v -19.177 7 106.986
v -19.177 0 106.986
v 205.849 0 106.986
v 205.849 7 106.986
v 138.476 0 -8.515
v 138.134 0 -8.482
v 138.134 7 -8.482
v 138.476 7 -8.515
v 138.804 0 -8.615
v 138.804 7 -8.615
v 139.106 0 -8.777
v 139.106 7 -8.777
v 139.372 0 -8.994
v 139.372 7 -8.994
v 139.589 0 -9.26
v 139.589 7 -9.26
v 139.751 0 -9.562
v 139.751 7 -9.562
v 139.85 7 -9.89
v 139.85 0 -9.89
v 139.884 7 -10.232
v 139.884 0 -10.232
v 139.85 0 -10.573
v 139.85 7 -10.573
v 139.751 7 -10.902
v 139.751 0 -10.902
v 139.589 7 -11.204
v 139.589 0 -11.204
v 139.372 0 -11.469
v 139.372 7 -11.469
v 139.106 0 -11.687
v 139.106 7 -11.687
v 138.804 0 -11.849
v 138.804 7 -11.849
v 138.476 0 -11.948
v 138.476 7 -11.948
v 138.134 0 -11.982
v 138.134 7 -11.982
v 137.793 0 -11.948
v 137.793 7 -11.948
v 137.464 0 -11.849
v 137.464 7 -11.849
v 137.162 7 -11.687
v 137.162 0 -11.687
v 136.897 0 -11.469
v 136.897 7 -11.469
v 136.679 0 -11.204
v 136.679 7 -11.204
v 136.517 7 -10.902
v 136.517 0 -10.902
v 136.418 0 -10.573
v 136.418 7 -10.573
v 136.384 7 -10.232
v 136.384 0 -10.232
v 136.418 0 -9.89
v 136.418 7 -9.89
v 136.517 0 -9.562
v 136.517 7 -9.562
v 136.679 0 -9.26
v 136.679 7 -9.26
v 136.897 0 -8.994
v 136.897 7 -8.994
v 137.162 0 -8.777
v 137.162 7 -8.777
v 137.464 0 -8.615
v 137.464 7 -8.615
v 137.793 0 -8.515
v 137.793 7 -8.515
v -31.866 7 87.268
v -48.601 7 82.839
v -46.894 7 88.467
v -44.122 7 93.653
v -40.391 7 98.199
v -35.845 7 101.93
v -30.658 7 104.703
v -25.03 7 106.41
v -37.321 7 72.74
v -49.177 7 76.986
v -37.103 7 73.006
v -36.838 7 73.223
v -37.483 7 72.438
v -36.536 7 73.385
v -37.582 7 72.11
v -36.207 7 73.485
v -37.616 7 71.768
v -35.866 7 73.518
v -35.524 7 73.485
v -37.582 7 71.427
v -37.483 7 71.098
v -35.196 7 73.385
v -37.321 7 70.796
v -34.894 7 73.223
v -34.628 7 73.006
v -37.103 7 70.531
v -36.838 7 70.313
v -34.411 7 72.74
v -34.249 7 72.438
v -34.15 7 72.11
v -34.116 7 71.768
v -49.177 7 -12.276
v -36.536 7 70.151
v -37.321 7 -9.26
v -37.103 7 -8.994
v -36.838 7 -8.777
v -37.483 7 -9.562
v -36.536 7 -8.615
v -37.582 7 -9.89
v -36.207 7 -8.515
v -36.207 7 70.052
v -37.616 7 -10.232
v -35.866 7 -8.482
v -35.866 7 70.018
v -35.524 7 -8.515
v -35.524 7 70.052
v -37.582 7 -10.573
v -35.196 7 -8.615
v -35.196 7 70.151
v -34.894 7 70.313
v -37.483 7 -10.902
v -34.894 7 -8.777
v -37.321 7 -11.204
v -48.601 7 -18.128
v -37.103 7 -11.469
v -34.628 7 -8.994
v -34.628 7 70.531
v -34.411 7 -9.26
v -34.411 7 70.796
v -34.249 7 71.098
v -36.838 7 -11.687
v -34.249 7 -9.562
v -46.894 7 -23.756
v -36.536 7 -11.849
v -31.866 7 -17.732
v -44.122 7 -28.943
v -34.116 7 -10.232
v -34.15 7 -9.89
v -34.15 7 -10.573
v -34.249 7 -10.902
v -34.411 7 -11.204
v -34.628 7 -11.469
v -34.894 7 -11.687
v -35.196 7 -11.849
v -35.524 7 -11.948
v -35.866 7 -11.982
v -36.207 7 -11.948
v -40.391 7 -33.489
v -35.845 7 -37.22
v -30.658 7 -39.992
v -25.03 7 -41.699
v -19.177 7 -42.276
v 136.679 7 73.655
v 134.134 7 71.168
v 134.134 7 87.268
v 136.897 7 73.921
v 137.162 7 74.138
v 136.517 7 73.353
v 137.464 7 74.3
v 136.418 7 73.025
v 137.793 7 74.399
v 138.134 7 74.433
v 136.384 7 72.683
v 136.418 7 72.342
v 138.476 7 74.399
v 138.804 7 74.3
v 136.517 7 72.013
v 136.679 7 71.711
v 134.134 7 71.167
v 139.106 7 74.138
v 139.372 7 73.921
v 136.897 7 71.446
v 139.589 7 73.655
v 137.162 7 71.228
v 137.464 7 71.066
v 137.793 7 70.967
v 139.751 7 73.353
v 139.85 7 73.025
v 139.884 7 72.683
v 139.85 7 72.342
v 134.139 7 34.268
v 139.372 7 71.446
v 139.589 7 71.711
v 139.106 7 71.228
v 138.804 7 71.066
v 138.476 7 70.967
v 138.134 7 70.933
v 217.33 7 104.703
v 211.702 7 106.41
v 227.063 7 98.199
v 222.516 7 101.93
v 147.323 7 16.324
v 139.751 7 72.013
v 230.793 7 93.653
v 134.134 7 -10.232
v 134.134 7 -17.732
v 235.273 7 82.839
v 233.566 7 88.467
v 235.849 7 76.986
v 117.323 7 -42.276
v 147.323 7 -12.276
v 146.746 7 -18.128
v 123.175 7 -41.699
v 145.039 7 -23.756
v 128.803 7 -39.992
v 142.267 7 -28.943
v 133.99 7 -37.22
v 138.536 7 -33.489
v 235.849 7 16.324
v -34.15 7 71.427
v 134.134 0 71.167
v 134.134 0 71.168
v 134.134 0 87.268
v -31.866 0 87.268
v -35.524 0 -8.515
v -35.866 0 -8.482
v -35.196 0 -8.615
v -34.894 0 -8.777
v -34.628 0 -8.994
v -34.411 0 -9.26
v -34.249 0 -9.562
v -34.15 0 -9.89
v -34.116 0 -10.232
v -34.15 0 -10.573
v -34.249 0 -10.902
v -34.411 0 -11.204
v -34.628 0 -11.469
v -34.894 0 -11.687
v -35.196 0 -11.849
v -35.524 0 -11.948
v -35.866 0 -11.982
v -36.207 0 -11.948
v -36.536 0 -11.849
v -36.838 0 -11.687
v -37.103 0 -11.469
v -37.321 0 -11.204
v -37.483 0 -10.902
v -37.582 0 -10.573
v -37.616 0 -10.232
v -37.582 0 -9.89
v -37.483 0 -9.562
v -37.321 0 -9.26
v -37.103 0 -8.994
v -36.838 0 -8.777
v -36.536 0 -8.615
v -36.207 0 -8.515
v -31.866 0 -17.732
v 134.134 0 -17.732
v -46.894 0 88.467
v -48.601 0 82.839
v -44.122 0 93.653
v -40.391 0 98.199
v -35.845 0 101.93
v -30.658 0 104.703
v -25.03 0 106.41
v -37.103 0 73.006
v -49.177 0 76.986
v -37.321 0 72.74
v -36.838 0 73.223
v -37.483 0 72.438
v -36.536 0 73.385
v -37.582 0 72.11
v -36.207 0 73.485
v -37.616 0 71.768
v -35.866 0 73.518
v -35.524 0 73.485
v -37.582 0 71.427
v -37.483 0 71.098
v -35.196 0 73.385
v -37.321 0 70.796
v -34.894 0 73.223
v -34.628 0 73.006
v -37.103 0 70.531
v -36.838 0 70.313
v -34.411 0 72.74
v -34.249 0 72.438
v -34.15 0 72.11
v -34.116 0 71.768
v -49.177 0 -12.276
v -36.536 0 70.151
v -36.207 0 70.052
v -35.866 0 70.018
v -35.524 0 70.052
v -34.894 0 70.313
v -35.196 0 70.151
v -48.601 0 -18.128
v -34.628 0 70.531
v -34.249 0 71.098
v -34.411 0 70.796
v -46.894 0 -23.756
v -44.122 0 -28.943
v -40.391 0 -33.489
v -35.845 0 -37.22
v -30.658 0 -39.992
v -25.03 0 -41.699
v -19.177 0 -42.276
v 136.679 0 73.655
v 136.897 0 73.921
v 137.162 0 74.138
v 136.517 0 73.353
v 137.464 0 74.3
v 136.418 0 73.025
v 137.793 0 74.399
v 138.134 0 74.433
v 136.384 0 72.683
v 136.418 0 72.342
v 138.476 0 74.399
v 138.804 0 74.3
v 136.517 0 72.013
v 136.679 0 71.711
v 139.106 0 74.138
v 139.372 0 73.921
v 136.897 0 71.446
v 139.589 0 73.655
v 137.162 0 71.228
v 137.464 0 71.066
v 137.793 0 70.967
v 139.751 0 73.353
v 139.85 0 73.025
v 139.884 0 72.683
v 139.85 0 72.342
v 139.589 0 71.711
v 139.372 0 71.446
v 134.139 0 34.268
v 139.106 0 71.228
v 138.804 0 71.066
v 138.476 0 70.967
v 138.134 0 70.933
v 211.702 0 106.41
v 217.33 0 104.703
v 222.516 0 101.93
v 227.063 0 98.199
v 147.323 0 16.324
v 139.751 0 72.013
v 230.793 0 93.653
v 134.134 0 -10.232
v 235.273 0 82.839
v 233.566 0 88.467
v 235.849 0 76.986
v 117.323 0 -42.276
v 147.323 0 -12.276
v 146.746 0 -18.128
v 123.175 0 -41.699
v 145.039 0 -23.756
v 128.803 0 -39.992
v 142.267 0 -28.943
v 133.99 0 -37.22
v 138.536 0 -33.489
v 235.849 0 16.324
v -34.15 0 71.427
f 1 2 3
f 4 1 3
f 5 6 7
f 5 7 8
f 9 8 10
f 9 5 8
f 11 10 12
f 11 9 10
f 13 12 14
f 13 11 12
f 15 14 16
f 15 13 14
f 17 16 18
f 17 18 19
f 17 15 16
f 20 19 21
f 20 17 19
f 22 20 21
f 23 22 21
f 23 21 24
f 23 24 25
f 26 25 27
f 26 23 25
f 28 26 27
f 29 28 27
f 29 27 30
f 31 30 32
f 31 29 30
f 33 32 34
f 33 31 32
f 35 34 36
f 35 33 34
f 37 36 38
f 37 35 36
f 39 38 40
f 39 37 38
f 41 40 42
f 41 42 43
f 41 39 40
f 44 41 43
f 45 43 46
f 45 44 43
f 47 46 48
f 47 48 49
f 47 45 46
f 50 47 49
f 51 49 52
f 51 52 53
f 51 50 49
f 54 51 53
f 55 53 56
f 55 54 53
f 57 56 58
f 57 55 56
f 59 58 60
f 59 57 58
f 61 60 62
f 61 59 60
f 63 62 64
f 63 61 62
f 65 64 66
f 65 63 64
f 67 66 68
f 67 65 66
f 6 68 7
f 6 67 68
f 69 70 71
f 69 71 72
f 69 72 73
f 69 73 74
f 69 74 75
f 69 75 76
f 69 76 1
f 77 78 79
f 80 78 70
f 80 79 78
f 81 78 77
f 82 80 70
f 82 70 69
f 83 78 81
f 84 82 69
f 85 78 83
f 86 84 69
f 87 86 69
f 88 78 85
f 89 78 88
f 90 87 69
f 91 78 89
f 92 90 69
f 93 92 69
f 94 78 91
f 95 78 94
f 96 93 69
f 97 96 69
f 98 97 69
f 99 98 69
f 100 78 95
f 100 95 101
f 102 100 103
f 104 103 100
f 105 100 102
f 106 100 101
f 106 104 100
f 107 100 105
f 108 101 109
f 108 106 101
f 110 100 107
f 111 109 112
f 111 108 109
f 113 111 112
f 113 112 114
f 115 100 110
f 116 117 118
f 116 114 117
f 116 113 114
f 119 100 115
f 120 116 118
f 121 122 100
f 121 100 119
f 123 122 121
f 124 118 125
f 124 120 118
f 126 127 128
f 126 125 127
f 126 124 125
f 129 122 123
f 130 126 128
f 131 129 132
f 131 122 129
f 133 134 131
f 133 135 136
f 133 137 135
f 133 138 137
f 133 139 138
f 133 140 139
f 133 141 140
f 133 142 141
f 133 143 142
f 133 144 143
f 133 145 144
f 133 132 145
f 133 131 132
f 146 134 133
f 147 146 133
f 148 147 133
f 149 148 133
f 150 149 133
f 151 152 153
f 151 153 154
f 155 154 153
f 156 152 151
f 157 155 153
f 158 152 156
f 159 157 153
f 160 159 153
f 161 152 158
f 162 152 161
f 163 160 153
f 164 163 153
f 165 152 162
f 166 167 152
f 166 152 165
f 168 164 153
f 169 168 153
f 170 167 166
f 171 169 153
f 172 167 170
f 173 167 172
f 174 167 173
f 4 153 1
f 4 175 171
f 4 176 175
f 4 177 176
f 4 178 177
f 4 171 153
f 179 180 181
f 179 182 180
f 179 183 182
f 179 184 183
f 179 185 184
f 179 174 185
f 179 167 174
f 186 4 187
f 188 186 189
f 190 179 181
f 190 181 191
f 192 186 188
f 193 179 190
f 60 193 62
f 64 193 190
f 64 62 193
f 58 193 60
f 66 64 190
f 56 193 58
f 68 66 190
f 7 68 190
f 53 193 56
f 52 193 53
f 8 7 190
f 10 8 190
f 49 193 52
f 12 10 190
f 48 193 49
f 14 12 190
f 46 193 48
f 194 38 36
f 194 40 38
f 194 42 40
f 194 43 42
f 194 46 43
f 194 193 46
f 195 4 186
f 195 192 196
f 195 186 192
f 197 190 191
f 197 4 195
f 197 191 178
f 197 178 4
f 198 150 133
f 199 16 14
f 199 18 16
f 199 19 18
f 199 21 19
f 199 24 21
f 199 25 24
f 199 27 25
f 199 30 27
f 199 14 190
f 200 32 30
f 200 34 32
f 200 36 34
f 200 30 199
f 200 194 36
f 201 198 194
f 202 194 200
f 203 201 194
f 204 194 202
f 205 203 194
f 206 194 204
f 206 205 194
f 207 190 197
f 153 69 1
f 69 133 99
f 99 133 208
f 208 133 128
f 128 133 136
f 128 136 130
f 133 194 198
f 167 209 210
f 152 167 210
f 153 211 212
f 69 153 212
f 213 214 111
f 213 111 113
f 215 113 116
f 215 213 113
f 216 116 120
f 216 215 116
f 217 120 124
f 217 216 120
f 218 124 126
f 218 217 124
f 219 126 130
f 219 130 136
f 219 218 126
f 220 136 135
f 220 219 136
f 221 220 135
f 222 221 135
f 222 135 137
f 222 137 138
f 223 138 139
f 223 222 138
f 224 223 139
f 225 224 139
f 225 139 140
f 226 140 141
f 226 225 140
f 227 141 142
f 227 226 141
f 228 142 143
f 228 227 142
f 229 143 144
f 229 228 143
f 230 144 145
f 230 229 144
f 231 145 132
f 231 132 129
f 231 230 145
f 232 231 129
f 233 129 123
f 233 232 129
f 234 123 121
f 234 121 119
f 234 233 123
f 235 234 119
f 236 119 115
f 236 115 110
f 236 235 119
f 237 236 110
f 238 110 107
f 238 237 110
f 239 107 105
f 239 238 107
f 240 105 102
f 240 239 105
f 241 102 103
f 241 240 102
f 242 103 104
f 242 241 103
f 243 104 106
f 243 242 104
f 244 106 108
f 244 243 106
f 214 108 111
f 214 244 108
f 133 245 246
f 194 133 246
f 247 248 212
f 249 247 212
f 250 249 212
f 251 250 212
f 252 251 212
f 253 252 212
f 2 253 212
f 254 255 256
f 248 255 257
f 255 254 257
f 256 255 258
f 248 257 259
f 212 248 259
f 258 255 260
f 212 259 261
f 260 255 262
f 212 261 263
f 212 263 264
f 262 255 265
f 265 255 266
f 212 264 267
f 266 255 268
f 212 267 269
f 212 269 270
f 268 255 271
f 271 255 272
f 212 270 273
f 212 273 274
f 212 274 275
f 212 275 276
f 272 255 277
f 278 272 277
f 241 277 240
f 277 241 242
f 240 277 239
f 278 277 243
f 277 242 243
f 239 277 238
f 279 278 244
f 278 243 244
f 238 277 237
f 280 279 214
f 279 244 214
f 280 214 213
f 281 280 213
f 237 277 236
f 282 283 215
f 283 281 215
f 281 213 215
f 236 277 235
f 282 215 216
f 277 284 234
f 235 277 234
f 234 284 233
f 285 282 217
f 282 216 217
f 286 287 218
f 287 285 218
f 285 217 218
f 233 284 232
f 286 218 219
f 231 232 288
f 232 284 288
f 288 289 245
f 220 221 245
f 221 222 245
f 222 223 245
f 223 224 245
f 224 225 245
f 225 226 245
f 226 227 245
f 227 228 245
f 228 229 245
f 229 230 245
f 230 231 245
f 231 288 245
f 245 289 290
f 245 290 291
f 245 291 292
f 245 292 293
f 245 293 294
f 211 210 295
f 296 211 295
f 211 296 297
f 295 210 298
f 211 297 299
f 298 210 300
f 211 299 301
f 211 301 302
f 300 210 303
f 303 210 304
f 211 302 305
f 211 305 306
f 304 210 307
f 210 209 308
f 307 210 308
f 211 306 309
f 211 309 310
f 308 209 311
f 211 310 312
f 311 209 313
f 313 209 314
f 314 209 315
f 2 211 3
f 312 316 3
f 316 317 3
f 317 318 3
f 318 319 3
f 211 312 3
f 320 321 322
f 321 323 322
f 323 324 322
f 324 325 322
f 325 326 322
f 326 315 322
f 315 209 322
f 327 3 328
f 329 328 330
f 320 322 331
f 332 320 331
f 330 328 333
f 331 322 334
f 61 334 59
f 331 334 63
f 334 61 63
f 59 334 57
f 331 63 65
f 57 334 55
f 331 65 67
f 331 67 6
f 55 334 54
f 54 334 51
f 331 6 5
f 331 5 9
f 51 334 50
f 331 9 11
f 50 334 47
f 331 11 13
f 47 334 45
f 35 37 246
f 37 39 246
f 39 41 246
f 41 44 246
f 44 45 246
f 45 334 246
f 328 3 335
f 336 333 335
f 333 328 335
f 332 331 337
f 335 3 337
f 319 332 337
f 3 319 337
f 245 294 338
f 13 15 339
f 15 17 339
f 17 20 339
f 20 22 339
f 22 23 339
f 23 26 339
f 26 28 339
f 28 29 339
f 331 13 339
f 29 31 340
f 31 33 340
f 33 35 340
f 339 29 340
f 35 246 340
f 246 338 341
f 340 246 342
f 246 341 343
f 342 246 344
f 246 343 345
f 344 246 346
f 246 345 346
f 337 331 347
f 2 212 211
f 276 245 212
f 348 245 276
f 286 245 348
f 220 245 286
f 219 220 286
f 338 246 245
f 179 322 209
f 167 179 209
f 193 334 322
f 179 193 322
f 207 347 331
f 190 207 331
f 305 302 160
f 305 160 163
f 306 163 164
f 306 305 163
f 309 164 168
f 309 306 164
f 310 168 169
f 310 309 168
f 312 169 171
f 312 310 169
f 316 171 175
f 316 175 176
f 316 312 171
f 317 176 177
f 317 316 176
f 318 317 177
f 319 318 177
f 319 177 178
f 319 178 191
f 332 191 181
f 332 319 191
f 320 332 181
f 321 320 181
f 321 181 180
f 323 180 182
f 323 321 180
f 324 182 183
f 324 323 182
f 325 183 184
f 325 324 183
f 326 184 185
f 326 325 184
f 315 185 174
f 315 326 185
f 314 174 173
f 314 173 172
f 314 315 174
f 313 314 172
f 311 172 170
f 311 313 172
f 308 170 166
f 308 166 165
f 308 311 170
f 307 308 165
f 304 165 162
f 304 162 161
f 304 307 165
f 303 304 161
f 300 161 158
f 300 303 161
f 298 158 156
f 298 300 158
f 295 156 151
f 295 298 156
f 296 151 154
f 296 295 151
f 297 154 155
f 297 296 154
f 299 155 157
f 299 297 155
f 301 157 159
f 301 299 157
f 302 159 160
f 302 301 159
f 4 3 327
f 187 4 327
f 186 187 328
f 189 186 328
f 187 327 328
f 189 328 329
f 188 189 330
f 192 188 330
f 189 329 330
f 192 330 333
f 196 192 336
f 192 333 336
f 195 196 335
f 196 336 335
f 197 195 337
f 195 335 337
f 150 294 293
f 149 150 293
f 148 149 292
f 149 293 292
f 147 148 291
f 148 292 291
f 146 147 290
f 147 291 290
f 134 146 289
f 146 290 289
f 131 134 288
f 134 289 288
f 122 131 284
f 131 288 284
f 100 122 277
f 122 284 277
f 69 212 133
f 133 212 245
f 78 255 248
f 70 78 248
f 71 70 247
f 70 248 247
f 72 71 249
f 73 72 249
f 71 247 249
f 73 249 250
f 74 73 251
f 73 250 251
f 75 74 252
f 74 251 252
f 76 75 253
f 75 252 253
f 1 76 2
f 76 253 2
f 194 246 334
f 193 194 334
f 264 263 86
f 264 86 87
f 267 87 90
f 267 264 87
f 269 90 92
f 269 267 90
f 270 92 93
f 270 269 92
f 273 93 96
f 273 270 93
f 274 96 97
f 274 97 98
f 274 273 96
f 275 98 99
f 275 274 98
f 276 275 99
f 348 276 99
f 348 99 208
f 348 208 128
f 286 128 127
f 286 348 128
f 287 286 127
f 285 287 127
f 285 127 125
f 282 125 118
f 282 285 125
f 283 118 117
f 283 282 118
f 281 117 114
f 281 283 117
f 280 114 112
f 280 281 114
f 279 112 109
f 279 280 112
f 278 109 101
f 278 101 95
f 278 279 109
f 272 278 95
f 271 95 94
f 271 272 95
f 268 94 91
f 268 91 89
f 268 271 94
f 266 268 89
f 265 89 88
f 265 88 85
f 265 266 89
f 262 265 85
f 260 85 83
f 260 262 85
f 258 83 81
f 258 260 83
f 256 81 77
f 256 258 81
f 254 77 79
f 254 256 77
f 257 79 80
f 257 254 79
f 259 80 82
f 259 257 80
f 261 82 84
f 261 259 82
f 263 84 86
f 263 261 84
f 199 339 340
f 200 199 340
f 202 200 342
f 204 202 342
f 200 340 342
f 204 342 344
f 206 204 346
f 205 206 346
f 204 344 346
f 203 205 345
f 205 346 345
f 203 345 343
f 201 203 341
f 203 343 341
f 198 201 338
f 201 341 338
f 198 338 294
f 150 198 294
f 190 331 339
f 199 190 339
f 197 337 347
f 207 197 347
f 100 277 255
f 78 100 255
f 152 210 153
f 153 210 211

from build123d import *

# Parameters (mm, degrees)
SKETCH1_R           = 1.75
BOSS_EXTRUDE1_DEPTH = 7


with BuildPart() as part:
    # Sketch1 → Boss-Extrude1 (new body)
    with BuildSketch(Plane(origin=(0, 0, 0), x_dir=(1, 0, 0), z_dir=(0, 1, 0))):
        with BuildLine():
            Line((117.322501745, 42.275563128), (-19.177498255, 42.275563128))
            ThreePointArc((-19.177498255, 42.275563128), (-40.39070169, 33.488766564), (-49.177498255, 12.275563128))
            Line((-49.177498255, 12.275563128), (-49.177498255, -76.986202657))
            ThreePointArc((-49.177498255, -76.986202657), (-40.39070169, -98.199406092), (-19.177498255, -106.986202657))
            Line((-19.177498255, -106.986202657), (156.322501745, -106.986202657))
            Line((156.322501745, -106.986202657), (205.849333343, -106.986202657))
            ThreePointArc((205.849333343, -106.986202657), (227.062536779, -98.199406092), (235.849333343, -76.986202657))
            Line((235.849333343, -76.986202657), (235.849333343, -16.324436872))
            Line((235.849333343, -16.324436872), (147.322501745, -16.324436872))
            Line((147.322501745, -16.324436872), (147.322501745, 12.275563128))
            ThreePointArc((147.322501745, 12.275563128), (138.535705181, 33.488766564), (117.322501745, 42.275563128))
        make_face()
        with Locations(Location((-35.865896123, -71.768154209, 0), (0, 0, 270))):
            Circle(SKETCH1_R, mode=Mode.SUBTRACT)
        Polygon((-31.865896123, -87.268154209), (-31.865896123, 17.731845791), (134.134103877, 17.731845791), (134.134103877, 10.231845791), (134.139344233, -34.268153014), (134.134104035, -71.167046413), (134.134103877, -71.16815413), (134.134103877, -87.268154209), align=None, mode=Mode.SUBTRACT)
        with Locations(Location((138.134103877, -72.683111915, 0), (0, 0, 270))):
            Circle(SKETCH1_R, mode=Mode.SUBTRACT)
        with Locations(Location((-35.865896123, 10.231845791, 0), (0, 0, 270))):
            Circle(SKETCH1_R, mode=Mode.SUBTRACT)
        with Locations(Location((138.134103877, 10.231845791, 0), (0, 0, 270))):
            Circle(SKETCH1_R, mode=Mode.SUBTRACT)
    extrude(amount=BOSS_EXTRUDE1_DEPTH)


solid = part.part
